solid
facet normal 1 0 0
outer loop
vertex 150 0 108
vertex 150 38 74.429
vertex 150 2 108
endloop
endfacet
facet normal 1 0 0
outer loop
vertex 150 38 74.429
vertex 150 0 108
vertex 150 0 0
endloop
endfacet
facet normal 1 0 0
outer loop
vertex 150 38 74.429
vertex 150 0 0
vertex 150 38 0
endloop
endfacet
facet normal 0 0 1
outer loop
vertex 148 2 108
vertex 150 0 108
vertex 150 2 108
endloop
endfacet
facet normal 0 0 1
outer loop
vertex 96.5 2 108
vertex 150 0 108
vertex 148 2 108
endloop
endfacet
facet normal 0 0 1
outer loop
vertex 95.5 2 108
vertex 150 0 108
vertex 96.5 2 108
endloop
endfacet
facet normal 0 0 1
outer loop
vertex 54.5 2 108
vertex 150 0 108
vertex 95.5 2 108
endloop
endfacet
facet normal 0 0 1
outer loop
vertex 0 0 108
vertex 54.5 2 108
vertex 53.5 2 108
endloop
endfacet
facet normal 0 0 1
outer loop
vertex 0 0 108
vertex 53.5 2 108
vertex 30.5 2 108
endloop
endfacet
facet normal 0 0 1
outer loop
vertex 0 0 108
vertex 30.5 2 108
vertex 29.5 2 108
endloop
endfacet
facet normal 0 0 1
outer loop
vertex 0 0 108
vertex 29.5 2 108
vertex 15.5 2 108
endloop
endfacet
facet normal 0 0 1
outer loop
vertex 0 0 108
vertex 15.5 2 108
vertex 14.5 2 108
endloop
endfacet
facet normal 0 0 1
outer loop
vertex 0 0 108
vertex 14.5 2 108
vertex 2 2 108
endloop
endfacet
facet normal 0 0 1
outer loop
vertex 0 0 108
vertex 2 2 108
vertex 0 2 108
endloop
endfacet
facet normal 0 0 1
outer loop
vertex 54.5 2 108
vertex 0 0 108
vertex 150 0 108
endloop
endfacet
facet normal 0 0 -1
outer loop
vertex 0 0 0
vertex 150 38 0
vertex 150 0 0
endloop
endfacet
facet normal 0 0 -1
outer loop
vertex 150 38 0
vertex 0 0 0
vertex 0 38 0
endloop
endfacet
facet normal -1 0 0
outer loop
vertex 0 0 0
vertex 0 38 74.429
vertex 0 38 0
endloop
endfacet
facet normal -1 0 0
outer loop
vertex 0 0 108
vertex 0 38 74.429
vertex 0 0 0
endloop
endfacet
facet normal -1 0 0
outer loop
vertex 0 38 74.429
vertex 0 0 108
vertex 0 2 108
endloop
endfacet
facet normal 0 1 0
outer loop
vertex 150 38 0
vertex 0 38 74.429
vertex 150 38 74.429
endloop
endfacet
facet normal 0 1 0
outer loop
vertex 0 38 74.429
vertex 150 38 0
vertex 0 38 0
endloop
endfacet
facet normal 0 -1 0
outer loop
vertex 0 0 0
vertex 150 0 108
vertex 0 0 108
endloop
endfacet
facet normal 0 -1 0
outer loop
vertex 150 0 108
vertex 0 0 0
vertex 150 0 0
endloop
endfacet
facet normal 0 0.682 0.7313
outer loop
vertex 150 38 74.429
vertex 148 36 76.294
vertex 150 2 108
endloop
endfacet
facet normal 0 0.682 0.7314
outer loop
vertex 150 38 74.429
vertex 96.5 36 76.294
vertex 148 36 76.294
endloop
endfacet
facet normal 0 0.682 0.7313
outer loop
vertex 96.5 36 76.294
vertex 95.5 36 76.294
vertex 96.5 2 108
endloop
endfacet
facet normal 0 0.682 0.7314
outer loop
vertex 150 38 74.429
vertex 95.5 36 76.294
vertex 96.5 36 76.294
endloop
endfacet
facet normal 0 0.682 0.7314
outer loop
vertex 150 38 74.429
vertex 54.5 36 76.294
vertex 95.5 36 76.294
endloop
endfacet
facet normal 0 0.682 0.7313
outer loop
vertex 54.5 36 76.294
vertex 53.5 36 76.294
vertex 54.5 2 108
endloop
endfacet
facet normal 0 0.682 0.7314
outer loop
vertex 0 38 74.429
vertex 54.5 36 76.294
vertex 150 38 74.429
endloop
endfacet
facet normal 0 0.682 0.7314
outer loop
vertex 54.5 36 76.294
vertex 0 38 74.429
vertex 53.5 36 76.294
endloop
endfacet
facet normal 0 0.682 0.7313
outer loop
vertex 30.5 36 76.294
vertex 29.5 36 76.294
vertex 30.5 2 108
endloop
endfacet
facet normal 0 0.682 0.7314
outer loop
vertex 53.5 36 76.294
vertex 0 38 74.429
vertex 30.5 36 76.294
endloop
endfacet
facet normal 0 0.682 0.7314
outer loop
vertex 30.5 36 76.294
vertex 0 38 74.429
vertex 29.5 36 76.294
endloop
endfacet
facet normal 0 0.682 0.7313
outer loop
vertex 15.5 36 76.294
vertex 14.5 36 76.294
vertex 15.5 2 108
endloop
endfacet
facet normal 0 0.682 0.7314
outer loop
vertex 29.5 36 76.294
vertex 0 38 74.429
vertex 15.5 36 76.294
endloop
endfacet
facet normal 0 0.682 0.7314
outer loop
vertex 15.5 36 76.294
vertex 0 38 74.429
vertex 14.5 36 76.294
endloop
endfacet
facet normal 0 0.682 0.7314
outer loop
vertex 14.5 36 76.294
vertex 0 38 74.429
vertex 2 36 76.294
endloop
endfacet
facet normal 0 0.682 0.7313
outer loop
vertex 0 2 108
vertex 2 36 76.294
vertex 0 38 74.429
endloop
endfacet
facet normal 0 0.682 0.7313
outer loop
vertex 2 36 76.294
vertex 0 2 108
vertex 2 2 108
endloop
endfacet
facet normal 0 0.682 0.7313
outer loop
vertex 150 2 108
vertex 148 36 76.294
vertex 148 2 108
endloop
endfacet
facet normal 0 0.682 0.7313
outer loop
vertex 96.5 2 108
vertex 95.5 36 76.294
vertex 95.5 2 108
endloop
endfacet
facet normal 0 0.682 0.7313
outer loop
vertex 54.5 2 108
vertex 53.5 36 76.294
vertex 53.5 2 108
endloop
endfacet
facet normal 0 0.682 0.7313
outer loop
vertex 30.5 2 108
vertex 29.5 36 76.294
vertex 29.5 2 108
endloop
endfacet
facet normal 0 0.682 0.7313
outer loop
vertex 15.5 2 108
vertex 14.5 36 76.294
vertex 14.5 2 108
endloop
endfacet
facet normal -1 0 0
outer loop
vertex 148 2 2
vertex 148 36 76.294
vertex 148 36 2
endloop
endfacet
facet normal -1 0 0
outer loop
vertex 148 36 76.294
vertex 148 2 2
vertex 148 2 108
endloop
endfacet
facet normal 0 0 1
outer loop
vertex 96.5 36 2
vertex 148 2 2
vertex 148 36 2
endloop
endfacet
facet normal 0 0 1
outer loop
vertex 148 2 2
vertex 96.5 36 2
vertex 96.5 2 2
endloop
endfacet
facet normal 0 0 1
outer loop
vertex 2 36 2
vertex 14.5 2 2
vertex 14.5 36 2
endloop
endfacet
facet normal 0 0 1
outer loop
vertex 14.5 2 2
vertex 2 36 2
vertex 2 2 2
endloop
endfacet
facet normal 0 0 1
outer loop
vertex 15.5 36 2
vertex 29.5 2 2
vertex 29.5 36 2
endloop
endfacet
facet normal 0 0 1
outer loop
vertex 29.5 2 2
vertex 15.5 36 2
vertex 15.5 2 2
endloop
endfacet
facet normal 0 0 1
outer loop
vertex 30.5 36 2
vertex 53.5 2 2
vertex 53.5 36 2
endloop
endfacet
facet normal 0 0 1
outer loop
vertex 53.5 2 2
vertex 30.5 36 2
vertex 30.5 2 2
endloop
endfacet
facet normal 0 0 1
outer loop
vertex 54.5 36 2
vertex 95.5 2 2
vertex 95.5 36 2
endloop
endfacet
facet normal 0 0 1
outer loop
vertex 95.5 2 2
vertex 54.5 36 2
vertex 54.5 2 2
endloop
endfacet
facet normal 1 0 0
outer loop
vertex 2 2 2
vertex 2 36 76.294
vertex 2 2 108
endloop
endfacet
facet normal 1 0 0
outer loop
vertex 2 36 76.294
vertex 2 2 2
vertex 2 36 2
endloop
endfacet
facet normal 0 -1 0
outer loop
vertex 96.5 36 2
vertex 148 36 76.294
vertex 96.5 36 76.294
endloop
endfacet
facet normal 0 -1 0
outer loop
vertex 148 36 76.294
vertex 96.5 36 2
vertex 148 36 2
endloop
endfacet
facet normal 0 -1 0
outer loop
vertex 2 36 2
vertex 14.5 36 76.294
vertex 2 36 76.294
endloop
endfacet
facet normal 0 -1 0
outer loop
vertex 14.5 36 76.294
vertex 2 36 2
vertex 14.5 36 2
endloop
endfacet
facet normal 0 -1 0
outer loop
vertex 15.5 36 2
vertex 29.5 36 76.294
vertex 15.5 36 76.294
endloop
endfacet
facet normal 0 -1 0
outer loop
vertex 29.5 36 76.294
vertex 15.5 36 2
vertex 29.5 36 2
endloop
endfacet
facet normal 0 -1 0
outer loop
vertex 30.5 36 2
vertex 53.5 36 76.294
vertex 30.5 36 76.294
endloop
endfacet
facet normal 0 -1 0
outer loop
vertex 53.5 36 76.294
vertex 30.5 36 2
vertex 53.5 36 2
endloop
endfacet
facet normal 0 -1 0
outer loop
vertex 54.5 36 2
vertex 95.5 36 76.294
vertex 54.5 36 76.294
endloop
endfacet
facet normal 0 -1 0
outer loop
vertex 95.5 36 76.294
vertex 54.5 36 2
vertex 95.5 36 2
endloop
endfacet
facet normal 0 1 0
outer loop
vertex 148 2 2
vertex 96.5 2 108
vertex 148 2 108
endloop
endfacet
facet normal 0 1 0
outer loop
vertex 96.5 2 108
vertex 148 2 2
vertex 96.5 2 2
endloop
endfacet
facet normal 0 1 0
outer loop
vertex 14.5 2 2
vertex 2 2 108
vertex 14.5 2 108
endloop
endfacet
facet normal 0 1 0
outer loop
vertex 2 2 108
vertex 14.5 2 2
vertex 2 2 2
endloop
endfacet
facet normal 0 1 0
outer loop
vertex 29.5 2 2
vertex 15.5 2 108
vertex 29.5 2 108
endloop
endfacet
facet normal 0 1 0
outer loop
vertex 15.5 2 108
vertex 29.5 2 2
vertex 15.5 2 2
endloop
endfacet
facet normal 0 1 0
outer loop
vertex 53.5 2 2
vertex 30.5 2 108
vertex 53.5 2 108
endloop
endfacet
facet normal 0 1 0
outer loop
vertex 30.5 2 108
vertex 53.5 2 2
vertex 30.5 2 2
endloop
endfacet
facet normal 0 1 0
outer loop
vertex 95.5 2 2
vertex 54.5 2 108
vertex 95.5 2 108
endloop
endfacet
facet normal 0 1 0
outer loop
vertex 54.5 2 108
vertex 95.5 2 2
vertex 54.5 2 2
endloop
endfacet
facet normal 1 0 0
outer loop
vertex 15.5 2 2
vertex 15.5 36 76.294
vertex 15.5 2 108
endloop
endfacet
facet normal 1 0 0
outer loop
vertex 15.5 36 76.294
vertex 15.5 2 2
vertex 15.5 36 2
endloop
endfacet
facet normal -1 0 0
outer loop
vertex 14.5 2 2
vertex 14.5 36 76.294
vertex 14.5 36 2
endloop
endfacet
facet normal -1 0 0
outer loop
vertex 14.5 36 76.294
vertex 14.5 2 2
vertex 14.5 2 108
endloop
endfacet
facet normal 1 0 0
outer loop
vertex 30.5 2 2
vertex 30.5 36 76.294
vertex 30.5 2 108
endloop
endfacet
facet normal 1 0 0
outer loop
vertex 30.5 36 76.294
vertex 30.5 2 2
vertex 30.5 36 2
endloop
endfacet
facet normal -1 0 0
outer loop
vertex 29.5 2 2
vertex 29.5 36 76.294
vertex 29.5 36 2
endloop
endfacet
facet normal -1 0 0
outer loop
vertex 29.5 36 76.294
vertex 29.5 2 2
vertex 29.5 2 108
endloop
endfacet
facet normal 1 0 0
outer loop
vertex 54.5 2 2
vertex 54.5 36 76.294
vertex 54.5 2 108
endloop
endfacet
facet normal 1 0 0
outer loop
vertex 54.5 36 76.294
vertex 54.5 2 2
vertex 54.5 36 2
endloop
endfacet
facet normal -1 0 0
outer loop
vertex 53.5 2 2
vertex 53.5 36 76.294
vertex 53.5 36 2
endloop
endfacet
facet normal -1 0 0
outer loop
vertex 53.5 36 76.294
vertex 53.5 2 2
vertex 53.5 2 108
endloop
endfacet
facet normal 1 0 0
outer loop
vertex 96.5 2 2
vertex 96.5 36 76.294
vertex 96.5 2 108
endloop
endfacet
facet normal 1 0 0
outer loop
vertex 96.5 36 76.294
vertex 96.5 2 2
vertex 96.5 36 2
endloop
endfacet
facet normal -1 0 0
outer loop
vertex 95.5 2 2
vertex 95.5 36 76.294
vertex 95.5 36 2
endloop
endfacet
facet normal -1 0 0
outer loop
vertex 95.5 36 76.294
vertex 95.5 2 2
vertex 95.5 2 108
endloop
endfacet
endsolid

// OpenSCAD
// customizable magnetic pencil holder
// created by james wickware - 7/14/16

// preview[view:north east, tilt:top diagonal]

/* [Size] */
// The overall width of the pencil holder in millimeters.
width = 150; // [0:0.5:400]

// The overall depth of the pencil holder in millimeters.
depth = 38; // [0:0.5:200]

// The overall height of the pencil holder in millimeters.
height = 108; // [0:0.5:200]

/* [Walls] */
// The thickness of the outer walls in millimeters.  
outer_wall_thickness = 2; // [0.5:0.5:20]

// The thickness of the inner walls in millimeters.
inner_wall_thickness = 1; // [0.5:0.5:20]

/* [Sections] */
// The number of sections the holder will be divided into.
sections = 5; // [1:30]

// Controls the size of each section is calculated. "Constant" will make each section the same size. "Increasing" will make each section double in size from the previous from left to right. "Decreasing" will make each section half the size of the previous from left to right.
division_mode = 2; // [0:Constant ,1: Increasing ,2:Decreasing]

// Sets the minimum size a section can be in millimeters for the "Increasing" and "Decreasing" division modes. *A large value here may cause less sections to be generated depending on the width of the holder and the number of sections selected.
minimum_section_width = 15; // [0:100]

/* [Bevel] */
// Controls how the opening of the holder is beveled.  
bevel_type = 0; // [0:Flat ,1:Round, 2:Scoop]

// Controls the angle of the bevel in degrees for Flat bevel and the radius for Round and Scoop bevels.
bevel= 43;	//	[0:0.5:80]
/* [Other] */
// Choose whether to generate the pencil holder standing upright or laying on its back.
upright =0; //[0:Yes, 1:No]
 
 
// generate holder upright or lying down
translate([0,height * upright,0]) // [0:Yes, 1:No]
rotate([upright * 90, 0,0])   
union()
{
    difference()
    {
        difference()
        {
            cube([width, depth, height],false);
            translate([-10,outer_wall_thickness,height])
            rotate([-bevel,0,0])
            
            // bevel outer walls
            if(bevel_type == 0)
            {                
                cube([width*2, depth*2, height*2],false);
            }

            if(bevel_type == 1)
            {
                translate([-outer_wall_thickness,depth+outer_wall_thickness,height]) 
                rotate([90,0,90])
                difference()
                {
                    translate( [-outer_wall_thickness, 0  ,0]) 
                    cylinder(h=width+(outer_wall_thickness*4), r=(depth/45)*bevel ) ;
                    translate([-((depth/45)*bevel) -outer_wall_thickness,-((depth/45)*bevel)   ,0]) 
                    cylinder(h=width+(outer_wall_thickness*8) , r=(depth/45)*bevel );    
                }
            }
            
            if(bevel_type == 2)
            {
                translate([-outer_wall_thickness,depth+outer_wall_thickness,height]) 
                rotate([90,0,90])
                cylinder(h=width+(outer_wall_thickness*2), r=(depth/45)*bevel);
            }  
        }
        
        translate([outer_wall_thickness,outer_wall_thickness,outer_wall_thickness])
        cube ([width - (outer_wall_thickness*2), depth- (outer_wall_thickness*2), height], false);
    };

    for(i = [1:sections-1  ])
    {    
        if(division_mode == 0)
        { 
            difference()
            {
                translate([((width/sections) * i - (inner_wall_thickness/2)),0 ,0])      
                cube([inner_wall_thickness, (depth), height],false);
                translate([-outer_wall_thickness,outer_wall_thickness,height])
                rotate([-bevel,0,0]) 
                
                // bevel inner walls 
                if(bevel_type == 0)
                {
                    cube([width*2, depth*2, height*2],false);
                }
              
                if(bevel_type == 1)
                {
                    translate([-outer_wall_thickness,depth+outer_wall_thickness,height]) 
                    rotate([90,0,90])
                    difference()
                    {
                        translate( [-outer_wall_thickness, 0  ,0]) 
                        cylinder(h=width+(outer_wall_thickness*4), r=(depth/45)*bevel ) ;
                        translate([-((depth/45)*bevel) -outer_wall_thickness,-((depth/45)*bevel)   ,0]) 
                        cylinder(h=width+(outer_wall_thickness*8) , r=(depth/45)*bevel );    
                    }
                }

                if(bevel_type == 2)
                {
                    translate([-outer_wall_thickness,depth+outer_wall_thickness,height]) 
                    rotate([90,0,90])
                    cylinder(h=width+(outer_wall_thickness*2), r=(depth/45)*bevel);
                }
            } 
        }
        
        // Increasing section size      
        if (division_mode == 1)
        {
            difference()
            {          
                translate([width - (min(max((((width/sections) * i)/(sections/i)),(minimum_section_width*i)), width )) +(inner_wall_thickness/2) ,0 ,0])    
                cube([inner_wall_thickness, (depth), height],false);
                translate([-outer_wall_thickness,outer_wall_thickness,height])
                rotate([-bevel,0,0]) 
                
                // bevel inner walls 
                if(bevel_type == 0)
                {
                    cube([width*2, depth*2, height*2],false);
                }
                
                if(bevel_type == 1)
                {
                    translate([-outer_wall_thickness,depth+outer_wall_thickness,height]) 
                    rotate([90,0,90])
                    difference()
                    {
                        translate( [-outer_wall_thickness, 0  ,0]) 
                        cylinder(h=width+(outer_wall_thickness*4), r=(depth/45)*bevel ) ;
                        translate([-((depth/45)*bevel) -outer_wall_thickness,-((depth/45)*bevel)   ,0]) 
                        cylinder(h=width+(outer_wall_thickness*8) , r=(depth/45)*bevel );    
                    }
                }
                    
                 if(bevel_type == 2)
                {
                    translate([-outer_wall_thickness,depth+outer_wall_thickness,height]) 
                    rotate([90,0,90])
                    cylinder(h=width+(outer_wall_thickness*2), r=(depth/45)*bevel);
                }
            } 
        }
        
        if (division_mode == 2)
        {
            difference()
            {          
                translate([min(max((((width/sections) * i)/(sections/i)),(minimum_section_width*i)), width ) -(inner_wall_thickness/2) ,0 ,0])    
                cube([inner_wall_thickness, (depth), height],false);
                translate([-outer_wall_thickness,outer_wall_thickness,height])
                rotate([-bevel,0,0]) 
                
                // bevel inner walls 
                if(bevel_type == 0)
                {
                    cube([width*2, depth*2, height*2],false);
                }
 
                if(bevel_type == 1)
                {
                    translate([-outer_wall_thickness,depth+outer_wall_thickness,height]) 
                    rotate([90,0,90])
                    difference()
                    {
                        translate( [-outer_wall_thickness, 0  ,0]) 
                        cylinder(h=width+(outer_wall_thickness*4), r=(depth/45)*bevel ) ;
                        translate([-((depth/45)*bevel) -outer_wall_thickness,-((depth/45)*bevel)   ,0]) 
                        cylinder(h=width+(outer_wall_thickness*8) , r=(depth/45)*bevel );    
                    }
                }
                
                if(bevel_type == 2)
                {
                    translate([-outer_wall_thickness,depth+outer_wall_thickness,height]) 
                    rotate([90,0,90])
                    cylinder(h=width+(outer_wall_thickness*2), r=(depth/45)*bevel);
                }
            } 
        }
    }
}
